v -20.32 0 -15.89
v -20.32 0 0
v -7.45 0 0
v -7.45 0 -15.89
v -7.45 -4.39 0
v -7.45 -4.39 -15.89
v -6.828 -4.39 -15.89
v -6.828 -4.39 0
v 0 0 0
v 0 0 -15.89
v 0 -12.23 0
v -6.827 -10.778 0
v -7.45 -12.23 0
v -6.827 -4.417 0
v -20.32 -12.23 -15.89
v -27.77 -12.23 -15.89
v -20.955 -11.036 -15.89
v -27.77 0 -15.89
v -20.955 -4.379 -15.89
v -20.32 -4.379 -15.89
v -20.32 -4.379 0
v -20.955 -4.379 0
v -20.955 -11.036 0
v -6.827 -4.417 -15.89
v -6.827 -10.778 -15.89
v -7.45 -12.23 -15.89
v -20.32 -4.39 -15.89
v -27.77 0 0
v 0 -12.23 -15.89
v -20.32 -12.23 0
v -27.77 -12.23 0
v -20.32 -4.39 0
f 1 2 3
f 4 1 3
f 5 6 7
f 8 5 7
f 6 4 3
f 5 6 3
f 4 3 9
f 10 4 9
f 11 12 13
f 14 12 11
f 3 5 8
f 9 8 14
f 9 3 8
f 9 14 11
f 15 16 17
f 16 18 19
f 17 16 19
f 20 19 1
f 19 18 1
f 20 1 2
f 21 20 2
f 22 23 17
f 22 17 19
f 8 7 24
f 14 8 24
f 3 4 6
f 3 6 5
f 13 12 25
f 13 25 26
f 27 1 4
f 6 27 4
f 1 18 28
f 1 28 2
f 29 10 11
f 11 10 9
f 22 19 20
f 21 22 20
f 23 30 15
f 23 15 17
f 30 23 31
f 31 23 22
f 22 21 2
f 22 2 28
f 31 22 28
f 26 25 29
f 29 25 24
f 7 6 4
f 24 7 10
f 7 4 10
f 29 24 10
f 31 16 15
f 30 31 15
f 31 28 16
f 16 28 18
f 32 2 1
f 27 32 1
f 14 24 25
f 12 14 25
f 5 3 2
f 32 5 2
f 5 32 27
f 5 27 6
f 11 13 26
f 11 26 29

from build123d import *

# Parameters (mm, degrees)
F0_W     = 7.45
F0_H     = 15.89
F1_DEPTH = 12.23
F2_DEPTH = 4.39
F4_DEPTH = 25.4
F6_DEPTH = 25.4
F8_DEPTH = 15.891


with BuildPart() as f1:
    # F0 (on Front) → F1 (new body)
    with BuildSketch(Plane.XZ):
        with Locations((-3.725, -7.945)):
            Rectangle(F0_W, F0_H)
    extrude(amount=F1_DEPTH)

    # F3 (on face) → F4 (cut)
    with BuildSketch(Plane(origin=(0, 0, -15.89), x_dir=(1, 0, 0), z_dir=(0, 0, -1))):
        Polygon((-6.8272673525, 10.7781076804), (-7.45, 12.23), (-7.45, 4.4166920707), (-6.8272673525, 4.4166920707), align=None)
    extrude(amount=-F4_DEPTH, mode=Mode.SUBTRACT)

    # F7 (on face) → F8 (cut, through all)
    with BuildSketch(Plane(origin=(0, 0, -15.89), x_dir=(1, 0, 0), z_dir=(0, 0, -1))):
        Polygon((-6.8272673525, 4.4166920707), (-7.45, 4.4166920707), (-7.45, 4.3904888444), (-6.8275989033, 4.3904888444), align=None)
    extrude(amount=-F8_DEPTH, mode=Mode.SUBTRACT)


with BuildPart() as f1b:
    # F0 (on Front) → F1, piece 2 (new body)
    with BuildSketch(Plane.XZ):
        Polygon((-20.32, -11.7879714817), (-20.32, 0), (-27.77, 0), (-27.77, -15.89), (-20.32, -15.89), align=None)
    extrude(amount=F1_DEPTH)

    # F5 (on face) → F6 (cut)
    with BuildSketch(Plane(origin=(0, 0, -15.89), x_dir=(1, 0, 0), z_dir=(0, 0, -1))):
        Polygon((-20.955, 4.379324615), (-20.32, 4.379324615), (-20.32, 12.23), (-20.955, 11.0357683152), align=None)
    extrude(amount=-F6_DEPTH, mode=Mode.SUBTRACT)


with BuildPart() as f2:
    # F0 (on Front) → F2 (new body)
    with BuildSketch(Plane.XZ):
        Polygon((-7.45, -15.89), (-7.45, 0), (-20.32, 0), (-20.32, -11.7879714817), (-20.32, -15.89), align=None)
    extrude(amount=F2_DEPTH)


solid = Compound([f1.part, f1b.part, f2.part])
